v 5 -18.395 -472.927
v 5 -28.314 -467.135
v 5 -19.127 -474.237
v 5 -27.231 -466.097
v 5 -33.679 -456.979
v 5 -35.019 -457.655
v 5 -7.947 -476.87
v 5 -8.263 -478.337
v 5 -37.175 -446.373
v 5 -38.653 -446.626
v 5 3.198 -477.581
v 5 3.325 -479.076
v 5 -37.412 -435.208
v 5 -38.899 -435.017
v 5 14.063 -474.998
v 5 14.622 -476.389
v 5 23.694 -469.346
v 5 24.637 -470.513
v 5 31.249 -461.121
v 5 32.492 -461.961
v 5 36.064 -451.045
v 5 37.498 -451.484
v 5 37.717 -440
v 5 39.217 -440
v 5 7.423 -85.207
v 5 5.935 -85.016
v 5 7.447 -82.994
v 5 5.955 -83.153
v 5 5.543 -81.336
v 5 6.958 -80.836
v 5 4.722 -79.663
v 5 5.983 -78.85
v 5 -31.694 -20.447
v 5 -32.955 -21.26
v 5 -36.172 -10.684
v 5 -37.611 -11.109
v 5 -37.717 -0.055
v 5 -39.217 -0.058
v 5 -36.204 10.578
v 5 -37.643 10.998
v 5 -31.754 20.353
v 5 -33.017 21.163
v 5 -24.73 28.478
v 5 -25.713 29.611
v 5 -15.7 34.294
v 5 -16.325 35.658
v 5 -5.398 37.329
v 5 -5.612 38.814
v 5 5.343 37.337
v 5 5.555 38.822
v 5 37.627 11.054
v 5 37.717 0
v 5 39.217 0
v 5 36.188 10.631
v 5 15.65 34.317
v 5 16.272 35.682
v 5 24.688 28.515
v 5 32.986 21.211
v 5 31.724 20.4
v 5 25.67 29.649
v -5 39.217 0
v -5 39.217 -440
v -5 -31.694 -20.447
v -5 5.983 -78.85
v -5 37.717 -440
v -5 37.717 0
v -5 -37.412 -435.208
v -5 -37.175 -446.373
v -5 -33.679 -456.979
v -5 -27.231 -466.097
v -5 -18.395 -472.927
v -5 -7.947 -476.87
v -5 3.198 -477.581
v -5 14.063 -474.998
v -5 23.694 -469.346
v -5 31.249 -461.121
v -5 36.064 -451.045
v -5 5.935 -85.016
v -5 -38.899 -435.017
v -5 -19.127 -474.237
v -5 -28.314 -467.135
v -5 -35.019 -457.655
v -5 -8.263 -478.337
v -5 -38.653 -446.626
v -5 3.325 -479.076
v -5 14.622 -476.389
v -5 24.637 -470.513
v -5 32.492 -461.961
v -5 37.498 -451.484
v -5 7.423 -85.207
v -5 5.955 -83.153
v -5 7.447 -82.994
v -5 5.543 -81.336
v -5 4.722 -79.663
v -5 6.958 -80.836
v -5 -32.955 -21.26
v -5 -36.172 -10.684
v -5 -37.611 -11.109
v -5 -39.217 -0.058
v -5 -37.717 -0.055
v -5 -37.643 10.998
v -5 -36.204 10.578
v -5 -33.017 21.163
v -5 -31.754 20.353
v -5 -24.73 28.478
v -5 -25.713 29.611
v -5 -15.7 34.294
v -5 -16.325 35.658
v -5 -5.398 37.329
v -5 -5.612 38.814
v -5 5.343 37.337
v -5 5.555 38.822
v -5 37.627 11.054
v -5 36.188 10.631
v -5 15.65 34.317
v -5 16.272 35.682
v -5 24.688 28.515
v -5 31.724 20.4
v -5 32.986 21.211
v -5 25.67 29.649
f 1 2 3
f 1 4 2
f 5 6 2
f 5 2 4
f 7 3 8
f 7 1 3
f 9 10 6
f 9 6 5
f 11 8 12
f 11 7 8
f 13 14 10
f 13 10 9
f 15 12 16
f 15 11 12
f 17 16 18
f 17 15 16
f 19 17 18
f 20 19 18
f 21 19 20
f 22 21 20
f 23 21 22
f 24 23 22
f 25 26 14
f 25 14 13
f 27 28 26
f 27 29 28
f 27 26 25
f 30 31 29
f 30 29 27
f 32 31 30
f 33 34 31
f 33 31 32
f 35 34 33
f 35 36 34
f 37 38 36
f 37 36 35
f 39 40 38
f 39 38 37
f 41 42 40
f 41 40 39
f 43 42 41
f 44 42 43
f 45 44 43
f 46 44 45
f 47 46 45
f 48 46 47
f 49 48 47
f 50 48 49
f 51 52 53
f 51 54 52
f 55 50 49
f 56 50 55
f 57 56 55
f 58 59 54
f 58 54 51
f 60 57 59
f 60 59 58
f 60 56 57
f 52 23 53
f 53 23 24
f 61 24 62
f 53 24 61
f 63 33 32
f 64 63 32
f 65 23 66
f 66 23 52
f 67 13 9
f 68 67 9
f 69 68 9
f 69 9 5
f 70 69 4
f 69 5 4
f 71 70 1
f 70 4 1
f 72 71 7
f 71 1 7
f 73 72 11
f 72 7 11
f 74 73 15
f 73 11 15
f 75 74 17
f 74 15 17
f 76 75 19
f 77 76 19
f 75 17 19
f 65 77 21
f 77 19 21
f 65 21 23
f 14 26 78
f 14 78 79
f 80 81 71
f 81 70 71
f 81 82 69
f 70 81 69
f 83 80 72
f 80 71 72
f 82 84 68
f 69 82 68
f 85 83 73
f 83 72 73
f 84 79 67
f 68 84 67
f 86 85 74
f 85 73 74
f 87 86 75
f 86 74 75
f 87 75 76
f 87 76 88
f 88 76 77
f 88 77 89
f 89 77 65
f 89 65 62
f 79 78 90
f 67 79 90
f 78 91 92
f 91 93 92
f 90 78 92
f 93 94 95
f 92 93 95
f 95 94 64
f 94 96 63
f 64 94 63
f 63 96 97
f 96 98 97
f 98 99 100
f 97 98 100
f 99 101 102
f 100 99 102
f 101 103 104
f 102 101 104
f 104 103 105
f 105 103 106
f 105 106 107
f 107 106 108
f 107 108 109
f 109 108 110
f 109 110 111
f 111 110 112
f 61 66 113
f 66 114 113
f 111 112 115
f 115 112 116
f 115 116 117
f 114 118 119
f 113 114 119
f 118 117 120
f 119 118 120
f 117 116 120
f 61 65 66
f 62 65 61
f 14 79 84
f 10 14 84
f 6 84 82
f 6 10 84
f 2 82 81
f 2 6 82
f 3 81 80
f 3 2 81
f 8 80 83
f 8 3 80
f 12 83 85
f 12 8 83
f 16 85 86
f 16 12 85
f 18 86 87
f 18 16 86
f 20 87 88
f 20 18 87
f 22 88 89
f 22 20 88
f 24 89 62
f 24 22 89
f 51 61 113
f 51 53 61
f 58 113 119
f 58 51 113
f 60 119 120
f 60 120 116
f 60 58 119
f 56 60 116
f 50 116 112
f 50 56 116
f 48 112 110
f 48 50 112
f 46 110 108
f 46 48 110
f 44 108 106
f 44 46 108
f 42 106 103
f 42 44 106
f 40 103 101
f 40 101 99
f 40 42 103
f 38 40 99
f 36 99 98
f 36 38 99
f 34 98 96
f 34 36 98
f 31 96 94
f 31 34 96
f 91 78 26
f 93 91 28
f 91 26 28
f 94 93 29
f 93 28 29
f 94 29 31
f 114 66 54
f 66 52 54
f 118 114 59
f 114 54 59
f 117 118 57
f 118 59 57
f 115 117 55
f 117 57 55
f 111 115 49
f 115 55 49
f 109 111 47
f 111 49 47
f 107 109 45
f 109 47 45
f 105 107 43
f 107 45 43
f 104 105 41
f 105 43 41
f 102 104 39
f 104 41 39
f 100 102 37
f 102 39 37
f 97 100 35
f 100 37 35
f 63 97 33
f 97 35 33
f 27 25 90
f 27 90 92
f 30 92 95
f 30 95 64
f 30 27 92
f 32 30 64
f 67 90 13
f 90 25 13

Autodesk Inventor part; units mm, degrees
ref_plane "YZ Plane" through (0, 0, 0) normal (1, 0, 0) x (0, 1, 0)
ref_plane "XZ Plane" through (0, 0, 0) normal (0, 1, 0) x (-1, 0, 0)
ref_plane "XY Plane" through (0, 0, 0) normal (0, 0, 1) x (1, 0, 0)
sketch "スケッチ1" plane through (0, 0, 0) normal (1, 0, 0) x (0, 1, 0)
  arc A0 (38.1972, 0) -> (-32.0976, -20.7068) centre (0, 0) ccw
  arc A1 (-37.8876, -435.1467) -> (38.1972, -440) centre (0, -440) ccw
  arc A2 (6.9469, -85.1461) -> (5.5796, -79.1102) centre (-2, -84) ccw
  line L0 (5.5796, -79.1102) -> (-32.0976, -20.7068)
  line L1 (38.1972, -440) -> (38.1972, 0)
  line L2 (6.9469, -85.1461) -> (-37.8876, -435.1467)
  arc A3 (39.2172, 0) -> (-32.9547, -21.2597) centre (0, 0) ccw
  line L3 (-32.9547, -21.2597) -> (4.7225, -79.6632)
  arc A4 (5.9352, -85.0165) -> (4.7225, -79.6632) centre (-2, -84) ccw
  line L4 (5.9352, -85.0165) -> (-38.8993, -435.0171)
  arc A5 (-38.8993, -435.0171) -> (39.2172, -440) centre (0, -440) ccw
  line L5 (39.2172, -440) -> (39.2172, 0)
  arc A6 (37.7172, 0) -> (-31.6942, -20.4466) centre (0, 0) ccw
  line L6 (-31.6942, -20.4466) -> (5.983, -78.85)
  arc A7 (7.423, -85.2071) -> (5.983, -78.85) centre (-2, -84) ccw
  line L7 (7.423, -85.2071) -> (-37.4115, -435.2077)
  arc A8 (-37.4115, -435.2077) -> (37.7172, -440) centre (0, -440) ccw
  line L8 (37.7172, -440) -> (37.7172, 0)
  dimension "d0" = 76.3944
  dimension "d1" = 76.3944
  dimension "d2" = 440
  dimension "d25" = 8
  dimension "d26" = 84
  dimension "d30" = 2
  dimension "d31" = 1.5
  dimension "d32" = 0.48
extrude "押し出し1" add sketch "スケッチ1" along normal mid plane 10 contours L1 A1 L2 A2 L0 A0 | L5 A5 L4 A4 L3 A3
equation "\"d0\" = d1"
properties part number "belt_1" material "ゴム"
